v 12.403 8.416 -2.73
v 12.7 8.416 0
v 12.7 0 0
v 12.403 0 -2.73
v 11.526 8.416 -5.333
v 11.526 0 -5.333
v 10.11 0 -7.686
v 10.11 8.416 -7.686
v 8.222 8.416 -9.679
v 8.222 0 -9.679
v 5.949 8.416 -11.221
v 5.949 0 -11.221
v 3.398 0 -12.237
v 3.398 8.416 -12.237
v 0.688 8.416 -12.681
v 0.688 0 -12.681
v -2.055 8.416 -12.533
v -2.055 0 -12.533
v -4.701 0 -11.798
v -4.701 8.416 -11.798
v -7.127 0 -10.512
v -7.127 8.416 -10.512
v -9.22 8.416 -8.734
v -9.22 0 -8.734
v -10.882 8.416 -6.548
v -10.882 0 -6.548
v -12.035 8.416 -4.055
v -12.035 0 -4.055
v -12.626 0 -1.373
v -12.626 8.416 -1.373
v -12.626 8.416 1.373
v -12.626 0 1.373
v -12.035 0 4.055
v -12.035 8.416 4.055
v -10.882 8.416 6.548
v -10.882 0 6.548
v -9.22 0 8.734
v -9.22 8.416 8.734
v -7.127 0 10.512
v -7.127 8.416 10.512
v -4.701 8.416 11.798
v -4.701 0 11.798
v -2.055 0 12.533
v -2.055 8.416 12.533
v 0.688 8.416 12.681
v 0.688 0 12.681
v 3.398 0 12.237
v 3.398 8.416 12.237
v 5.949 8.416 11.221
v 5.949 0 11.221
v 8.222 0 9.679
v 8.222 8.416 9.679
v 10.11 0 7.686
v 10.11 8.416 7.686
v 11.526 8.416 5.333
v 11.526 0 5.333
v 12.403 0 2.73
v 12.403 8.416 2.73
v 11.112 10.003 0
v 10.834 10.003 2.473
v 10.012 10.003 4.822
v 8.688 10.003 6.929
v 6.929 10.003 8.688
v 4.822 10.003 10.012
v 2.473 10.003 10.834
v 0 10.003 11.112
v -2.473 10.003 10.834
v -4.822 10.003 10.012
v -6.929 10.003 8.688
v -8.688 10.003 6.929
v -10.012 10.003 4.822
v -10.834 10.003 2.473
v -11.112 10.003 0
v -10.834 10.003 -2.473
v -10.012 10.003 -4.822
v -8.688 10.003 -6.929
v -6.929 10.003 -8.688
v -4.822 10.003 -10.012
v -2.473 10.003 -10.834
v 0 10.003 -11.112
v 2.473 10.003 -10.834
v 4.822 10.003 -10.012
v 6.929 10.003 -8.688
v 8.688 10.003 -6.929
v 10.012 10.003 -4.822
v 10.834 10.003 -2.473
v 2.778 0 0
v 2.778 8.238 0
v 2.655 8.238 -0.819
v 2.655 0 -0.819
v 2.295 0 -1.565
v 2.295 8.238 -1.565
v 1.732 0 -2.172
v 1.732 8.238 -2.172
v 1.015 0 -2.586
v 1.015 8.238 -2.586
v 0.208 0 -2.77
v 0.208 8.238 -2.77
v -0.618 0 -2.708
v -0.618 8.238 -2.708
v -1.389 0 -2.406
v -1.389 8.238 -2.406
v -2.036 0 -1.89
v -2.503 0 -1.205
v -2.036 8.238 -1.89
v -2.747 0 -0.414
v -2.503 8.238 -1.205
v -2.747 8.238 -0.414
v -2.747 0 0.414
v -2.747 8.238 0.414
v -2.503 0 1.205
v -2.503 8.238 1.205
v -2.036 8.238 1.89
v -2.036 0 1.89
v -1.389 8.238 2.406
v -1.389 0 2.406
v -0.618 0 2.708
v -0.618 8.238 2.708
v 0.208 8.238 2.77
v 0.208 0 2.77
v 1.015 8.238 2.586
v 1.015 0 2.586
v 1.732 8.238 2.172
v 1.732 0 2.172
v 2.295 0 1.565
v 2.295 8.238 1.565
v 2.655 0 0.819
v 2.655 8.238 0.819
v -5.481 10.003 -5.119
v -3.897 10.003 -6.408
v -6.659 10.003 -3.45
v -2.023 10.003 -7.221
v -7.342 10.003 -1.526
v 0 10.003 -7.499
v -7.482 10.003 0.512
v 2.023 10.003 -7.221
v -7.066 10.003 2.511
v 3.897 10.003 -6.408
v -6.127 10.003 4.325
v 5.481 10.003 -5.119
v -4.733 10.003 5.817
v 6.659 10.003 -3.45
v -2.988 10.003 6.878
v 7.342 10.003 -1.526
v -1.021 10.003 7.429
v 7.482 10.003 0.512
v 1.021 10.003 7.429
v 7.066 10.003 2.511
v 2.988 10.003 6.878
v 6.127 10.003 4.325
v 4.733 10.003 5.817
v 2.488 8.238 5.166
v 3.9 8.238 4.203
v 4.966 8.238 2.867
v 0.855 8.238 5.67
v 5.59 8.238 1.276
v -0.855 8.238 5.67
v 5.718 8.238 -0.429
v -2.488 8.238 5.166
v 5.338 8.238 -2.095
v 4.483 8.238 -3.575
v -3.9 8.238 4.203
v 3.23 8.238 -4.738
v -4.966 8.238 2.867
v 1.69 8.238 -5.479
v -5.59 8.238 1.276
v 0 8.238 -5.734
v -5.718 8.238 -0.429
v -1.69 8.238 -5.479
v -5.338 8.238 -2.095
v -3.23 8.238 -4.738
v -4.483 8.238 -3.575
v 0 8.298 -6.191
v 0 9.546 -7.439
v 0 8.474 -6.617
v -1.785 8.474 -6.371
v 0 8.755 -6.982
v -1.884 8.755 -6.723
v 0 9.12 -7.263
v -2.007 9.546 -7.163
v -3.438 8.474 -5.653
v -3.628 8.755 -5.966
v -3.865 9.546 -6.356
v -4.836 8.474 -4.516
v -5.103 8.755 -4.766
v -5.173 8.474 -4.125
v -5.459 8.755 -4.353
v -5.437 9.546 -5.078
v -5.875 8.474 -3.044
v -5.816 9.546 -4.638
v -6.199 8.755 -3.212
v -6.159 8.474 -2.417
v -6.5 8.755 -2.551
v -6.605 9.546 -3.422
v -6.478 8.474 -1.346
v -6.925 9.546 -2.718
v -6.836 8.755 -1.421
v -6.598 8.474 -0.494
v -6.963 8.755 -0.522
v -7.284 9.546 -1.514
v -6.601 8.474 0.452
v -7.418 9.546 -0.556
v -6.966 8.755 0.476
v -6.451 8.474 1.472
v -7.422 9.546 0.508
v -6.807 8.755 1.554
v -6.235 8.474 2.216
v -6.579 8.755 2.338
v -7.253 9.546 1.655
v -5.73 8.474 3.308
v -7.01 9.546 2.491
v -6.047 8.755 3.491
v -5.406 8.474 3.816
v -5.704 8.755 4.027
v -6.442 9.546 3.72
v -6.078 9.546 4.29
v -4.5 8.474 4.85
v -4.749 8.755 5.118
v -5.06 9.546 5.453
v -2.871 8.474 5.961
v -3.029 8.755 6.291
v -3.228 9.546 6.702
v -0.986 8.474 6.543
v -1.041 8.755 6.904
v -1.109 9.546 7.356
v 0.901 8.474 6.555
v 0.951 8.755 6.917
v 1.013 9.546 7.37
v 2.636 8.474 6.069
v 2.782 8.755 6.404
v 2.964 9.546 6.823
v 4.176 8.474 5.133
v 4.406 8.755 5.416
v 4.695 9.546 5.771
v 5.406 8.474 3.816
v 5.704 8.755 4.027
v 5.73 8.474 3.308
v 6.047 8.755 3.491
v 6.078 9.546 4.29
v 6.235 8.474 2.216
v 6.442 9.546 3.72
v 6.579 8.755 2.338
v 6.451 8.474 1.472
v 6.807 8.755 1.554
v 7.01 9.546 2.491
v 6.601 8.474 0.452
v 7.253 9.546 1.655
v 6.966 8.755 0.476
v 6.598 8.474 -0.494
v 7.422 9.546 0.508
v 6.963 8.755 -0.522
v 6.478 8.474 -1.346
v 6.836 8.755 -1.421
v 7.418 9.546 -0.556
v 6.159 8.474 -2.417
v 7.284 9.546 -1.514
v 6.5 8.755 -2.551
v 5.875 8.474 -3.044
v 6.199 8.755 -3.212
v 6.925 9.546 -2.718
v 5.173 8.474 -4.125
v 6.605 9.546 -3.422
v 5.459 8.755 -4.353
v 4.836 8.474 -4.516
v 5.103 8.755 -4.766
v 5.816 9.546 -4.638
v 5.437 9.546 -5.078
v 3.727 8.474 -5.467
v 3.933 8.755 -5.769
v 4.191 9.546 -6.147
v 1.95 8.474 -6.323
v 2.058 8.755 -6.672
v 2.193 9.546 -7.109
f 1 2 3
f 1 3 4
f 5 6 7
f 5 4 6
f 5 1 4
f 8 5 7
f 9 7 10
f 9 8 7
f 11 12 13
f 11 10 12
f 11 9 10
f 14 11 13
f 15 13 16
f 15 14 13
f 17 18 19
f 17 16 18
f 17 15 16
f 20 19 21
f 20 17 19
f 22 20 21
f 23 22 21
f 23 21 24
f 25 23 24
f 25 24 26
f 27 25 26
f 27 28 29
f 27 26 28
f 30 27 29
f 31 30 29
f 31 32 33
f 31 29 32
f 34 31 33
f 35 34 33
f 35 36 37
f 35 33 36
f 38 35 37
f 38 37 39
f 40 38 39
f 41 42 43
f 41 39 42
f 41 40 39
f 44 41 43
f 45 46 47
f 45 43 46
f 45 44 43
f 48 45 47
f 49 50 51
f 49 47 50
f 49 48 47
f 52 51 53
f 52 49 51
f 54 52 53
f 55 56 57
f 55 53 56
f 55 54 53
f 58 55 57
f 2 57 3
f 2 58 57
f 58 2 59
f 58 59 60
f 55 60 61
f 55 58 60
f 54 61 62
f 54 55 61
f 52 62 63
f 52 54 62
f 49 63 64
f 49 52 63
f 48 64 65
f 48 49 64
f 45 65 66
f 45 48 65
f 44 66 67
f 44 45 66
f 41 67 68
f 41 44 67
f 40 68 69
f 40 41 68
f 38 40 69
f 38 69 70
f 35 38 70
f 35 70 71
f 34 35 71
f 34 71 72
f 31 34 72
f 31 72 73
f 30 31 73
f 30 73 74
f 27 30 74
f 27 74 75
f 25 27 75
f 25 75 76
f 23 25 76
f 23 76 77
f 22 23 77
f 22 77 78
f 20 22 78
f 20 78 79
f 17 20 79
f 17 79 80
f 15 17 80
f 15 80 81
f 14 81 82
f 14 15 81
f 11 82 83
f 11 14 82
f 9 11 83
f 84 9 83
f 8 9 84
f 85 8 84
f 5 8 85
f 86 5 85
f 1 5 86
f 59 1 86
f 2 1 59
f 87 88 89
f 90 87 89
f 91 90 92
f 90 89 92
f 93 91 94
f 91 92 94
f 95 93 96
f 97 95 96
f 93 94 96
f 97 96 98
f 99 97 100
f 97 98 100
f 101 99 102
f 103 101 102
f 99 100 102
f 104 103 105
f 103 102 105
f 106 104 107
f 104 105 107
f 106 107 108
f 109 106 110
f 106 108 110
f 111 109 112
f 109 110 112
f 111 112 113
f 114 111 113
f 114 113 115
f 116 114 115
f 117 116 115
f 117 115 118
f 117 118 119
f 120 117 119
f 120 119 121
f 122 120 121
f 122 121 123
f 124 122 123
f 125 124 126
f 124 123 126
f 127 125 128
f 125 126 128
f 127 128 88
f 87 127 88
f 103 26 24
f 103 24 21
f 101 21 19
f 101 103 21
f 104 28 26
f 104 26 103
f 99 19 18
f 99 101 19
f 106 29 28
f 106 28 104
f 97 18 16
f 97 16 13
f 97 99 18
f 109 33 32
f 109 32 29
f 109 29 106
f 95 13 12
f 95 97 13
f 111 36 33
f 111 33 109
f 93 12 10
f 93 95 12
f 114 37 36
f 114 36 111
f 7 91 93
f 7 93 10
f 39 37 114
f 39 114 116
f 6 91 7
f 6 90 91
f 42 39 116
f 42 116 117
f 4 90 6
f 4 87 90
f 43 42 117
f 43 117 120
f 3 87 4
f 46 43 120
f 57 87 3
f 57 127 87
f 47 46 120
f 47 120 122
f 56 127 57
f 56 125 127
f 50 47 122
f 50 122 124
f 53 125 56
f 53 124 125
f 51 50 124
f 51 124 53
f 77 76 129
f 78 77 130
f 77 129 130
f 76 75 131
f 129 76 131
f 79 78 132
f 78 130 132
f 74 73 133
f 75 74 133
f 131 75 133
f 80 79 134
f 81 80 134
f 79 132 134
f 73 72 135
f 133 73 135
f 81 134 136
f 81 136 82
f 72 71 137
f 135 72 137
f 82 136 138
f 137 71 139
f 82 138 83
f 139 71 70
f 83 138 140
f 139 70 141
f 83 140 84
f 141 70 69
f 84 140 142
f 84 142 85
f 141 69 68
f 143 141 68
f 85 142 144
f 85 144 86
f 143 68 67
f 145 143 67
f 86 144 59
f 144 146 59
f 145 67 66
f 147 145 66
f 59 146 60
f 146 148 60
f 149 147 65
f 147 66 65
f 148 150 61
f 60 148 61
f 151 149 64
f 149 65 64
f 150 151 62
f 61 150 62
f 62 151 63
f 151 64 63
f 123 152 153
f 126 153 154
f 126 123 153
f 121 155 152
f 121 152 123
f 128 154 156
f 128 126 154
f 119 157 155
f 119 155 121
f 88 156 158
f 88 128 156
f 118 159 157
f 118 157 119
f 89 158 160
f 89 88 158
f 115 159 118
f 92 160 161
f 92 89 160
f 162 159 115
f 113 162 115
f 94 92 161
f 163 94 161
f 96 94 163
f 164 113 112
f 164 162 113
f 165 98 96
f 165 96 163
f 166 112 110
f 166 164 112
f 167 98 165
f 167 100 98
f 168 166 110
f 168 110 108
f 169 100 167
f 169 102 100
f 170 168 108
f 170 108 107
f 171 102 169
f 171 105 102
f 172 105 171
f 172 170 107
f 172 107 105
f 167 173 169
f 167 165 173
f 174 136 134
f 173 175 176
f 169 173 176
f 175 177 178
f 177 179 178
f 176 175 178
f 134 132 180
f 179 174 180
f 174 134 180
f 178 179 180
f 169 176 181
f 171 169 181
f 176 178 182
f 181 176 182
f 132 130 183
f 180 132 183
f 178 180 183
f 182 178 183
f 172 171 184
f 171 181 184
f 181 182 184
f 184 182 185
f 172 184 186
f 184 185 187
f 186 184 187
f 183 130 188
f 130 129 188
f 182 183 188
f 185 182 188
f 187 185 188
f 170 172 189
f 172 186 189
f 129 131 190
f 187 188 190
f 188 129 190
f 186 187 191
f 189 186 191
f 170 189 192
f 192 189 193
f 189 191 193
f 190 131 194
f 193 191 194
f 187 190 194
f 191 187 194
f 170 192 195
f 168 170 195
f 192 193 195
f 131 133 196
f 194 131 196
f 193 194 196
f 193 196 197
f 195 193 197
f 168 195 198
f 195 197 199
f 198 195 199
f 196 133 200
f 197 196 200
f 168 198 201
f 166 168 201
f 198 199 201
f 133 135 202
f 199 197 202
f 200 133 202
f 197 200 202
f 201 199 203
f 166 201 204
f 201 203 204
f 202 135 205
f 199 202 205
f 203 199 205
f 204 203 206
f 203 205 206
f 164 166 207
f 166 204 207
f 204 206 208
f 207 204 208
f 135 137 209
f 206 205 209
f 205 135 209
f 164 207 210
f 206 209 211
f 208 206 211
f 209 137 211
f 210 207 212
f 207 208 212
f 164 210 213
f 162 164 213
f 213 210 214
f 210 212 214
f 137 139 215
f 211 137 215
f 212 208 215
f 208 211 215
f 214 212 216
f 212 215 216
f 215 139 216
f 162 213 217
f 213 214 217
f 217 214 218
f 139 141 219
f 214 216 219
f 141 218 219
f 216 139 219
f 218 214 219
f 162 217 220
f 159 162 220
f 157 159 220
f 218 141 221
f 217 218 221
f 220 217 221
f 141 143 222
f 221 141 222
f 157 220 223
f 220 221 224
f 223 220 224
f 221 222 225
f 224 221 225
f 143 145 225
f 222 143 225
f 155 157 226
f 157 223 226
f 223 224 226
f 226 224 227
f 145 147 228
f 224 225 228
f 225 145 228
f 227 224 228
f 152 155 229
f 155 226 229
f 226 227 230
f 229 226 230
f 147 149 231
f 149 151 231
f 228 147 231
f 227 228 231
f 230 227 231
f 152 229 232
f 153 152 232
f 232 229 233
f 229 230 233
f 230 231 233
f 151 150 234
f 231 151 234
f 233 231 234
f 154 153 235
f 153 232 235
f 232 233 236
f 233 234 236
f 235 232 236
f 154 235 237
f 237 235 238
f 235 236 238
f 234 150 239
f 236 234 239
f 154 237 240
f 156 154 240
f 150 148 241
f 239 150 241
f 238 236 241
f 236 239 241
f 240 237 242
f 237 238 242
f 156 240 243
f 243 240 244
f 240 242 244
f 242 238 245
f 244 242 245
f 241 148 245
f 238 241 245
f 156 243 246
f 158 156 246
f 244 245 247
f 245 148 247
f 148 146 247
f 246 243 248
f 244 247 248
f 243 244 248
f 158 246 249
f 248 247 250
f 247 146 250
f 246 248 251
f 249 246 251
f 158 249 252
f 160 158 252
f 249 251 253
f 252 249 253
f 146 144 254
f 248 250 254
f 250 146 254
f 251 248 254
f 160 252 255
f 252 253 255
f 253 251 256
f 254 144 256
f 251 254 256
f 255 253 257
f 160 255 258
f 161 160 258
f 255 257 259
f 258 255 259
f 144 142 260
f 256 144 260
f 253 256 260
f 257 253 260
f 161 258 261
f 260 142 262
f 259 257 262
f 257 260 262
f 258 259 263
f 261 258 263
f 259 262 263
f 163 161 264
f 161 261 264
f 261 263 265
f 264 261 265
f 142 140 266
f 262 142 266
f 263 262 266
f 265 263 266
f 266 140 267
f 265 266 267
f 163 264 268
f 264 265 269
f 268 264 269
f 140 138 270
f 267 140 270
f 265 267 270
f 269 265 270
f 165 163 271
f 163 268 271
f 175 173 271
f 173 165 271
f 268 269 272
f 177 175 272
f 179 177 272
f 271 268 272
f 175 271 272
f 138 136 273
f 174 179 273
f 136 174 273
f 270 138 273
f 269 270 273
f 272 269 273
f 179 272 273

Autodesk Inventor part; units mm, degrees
ref_plane "YZ Plane" through (0, 0, 0) normal (1, 0, 0) x (0, 1, 0)
ref_plane "XZ Plane" through (0, 0, 0) normal (0, 1, 0) x (-1, 0, 0)
ref_plane "XY Plane" through (0, 0, 0) normal (0, 0, 1) x (1, 0, 0)
sketch "Sketch1" plane through (0, 0, 0) normal (0, 0, 1) x (1, 0, 0)
  line L0 (0, 0) -> (0, 6.35)
  line L1 (12.7, 0) -> (0, 0)
  circle A0 centre (10.1178, 6.9428) radius 1.5875
  line L2 (0, 6.35) -> (8.6451, 6.35)
  line L3 (12.7, 0) -> (12.7, 6.35)
  line L4 (12.7, 6.35) -> (11.5905, 6.35)
  line L5 (9.525, 8.4155) -> (0, 8.4155)
  line L6 (0, 8.4155) -> (0, 6.35)
  line L7 (9.525, 8.4155) -> (11.5905, 6.35) construction
  line L8 (9.525, 8.4155) -> (9.525, 10.003)
  line L9 (9.525, 10.003) -> (0, 10.003)
  line L10 (0, 10.003) -> (0, 8.4155)
  line L11 (12.7, 6.35) -> (12.7, 10.003)
  line L12 (12.7, 10.003) -> (9.525, 10.003)
  dimension "d0" = 3.175
  dimension "d5" = 45
  dimension "d6" = 1.5875
  dimension "d7" = 3.175
  dimension "d8" = 6.35
  dimension "d14" = 2.921
  dimension "d37" = 12.7
revolve "Revolution1" add sketch "Sketch1" angle 360 about axis through (0, 10.003, 0) along (0, -1, 0)
sketch "Sketch8" plane through (0, 0, 0) normal (1, 0, 0) x (0, 1, 0)
  circle A0 centre (10.003, -5.734) radius 1.7653
  line L0 (10.003, 0) -> (8.2377, 0)
  line L1 (8.2377, 0) -> (8.2377, -5.734)
  line L2 (10.003, 13.6947) -> (10.003, -13.6947) projected
  line L3 (10.003, -5.734) -> (10.003, -3.9688) construction
  line L4 (-2.3537, 0) -> (14.1219, 0) projected
  point P0 (0, 0)
  dimension "d31" = 3.5306
  dimension "d32" = 3.9688
revolve "Revolution3" cut sketch "Sketch8" angle 360 about axis through (0, -10, 0) along (0, 1, 0)
sketch "Sketch9" plane through (0, 8.2377, 0) normal (0, 1, 0) x (1, 0, 0)
  circle A0 centre (0, 0) radius 2.7781
  dimension "d34" = 5.5563
extrude "Extrusion4" cut sketch "Sketch9" against normal through all
chamfer "Chamfer3" distance 1.5875 angle 45 1 edges at (-12.7, 10.003, 0)
properties part number "Diaphragme"
